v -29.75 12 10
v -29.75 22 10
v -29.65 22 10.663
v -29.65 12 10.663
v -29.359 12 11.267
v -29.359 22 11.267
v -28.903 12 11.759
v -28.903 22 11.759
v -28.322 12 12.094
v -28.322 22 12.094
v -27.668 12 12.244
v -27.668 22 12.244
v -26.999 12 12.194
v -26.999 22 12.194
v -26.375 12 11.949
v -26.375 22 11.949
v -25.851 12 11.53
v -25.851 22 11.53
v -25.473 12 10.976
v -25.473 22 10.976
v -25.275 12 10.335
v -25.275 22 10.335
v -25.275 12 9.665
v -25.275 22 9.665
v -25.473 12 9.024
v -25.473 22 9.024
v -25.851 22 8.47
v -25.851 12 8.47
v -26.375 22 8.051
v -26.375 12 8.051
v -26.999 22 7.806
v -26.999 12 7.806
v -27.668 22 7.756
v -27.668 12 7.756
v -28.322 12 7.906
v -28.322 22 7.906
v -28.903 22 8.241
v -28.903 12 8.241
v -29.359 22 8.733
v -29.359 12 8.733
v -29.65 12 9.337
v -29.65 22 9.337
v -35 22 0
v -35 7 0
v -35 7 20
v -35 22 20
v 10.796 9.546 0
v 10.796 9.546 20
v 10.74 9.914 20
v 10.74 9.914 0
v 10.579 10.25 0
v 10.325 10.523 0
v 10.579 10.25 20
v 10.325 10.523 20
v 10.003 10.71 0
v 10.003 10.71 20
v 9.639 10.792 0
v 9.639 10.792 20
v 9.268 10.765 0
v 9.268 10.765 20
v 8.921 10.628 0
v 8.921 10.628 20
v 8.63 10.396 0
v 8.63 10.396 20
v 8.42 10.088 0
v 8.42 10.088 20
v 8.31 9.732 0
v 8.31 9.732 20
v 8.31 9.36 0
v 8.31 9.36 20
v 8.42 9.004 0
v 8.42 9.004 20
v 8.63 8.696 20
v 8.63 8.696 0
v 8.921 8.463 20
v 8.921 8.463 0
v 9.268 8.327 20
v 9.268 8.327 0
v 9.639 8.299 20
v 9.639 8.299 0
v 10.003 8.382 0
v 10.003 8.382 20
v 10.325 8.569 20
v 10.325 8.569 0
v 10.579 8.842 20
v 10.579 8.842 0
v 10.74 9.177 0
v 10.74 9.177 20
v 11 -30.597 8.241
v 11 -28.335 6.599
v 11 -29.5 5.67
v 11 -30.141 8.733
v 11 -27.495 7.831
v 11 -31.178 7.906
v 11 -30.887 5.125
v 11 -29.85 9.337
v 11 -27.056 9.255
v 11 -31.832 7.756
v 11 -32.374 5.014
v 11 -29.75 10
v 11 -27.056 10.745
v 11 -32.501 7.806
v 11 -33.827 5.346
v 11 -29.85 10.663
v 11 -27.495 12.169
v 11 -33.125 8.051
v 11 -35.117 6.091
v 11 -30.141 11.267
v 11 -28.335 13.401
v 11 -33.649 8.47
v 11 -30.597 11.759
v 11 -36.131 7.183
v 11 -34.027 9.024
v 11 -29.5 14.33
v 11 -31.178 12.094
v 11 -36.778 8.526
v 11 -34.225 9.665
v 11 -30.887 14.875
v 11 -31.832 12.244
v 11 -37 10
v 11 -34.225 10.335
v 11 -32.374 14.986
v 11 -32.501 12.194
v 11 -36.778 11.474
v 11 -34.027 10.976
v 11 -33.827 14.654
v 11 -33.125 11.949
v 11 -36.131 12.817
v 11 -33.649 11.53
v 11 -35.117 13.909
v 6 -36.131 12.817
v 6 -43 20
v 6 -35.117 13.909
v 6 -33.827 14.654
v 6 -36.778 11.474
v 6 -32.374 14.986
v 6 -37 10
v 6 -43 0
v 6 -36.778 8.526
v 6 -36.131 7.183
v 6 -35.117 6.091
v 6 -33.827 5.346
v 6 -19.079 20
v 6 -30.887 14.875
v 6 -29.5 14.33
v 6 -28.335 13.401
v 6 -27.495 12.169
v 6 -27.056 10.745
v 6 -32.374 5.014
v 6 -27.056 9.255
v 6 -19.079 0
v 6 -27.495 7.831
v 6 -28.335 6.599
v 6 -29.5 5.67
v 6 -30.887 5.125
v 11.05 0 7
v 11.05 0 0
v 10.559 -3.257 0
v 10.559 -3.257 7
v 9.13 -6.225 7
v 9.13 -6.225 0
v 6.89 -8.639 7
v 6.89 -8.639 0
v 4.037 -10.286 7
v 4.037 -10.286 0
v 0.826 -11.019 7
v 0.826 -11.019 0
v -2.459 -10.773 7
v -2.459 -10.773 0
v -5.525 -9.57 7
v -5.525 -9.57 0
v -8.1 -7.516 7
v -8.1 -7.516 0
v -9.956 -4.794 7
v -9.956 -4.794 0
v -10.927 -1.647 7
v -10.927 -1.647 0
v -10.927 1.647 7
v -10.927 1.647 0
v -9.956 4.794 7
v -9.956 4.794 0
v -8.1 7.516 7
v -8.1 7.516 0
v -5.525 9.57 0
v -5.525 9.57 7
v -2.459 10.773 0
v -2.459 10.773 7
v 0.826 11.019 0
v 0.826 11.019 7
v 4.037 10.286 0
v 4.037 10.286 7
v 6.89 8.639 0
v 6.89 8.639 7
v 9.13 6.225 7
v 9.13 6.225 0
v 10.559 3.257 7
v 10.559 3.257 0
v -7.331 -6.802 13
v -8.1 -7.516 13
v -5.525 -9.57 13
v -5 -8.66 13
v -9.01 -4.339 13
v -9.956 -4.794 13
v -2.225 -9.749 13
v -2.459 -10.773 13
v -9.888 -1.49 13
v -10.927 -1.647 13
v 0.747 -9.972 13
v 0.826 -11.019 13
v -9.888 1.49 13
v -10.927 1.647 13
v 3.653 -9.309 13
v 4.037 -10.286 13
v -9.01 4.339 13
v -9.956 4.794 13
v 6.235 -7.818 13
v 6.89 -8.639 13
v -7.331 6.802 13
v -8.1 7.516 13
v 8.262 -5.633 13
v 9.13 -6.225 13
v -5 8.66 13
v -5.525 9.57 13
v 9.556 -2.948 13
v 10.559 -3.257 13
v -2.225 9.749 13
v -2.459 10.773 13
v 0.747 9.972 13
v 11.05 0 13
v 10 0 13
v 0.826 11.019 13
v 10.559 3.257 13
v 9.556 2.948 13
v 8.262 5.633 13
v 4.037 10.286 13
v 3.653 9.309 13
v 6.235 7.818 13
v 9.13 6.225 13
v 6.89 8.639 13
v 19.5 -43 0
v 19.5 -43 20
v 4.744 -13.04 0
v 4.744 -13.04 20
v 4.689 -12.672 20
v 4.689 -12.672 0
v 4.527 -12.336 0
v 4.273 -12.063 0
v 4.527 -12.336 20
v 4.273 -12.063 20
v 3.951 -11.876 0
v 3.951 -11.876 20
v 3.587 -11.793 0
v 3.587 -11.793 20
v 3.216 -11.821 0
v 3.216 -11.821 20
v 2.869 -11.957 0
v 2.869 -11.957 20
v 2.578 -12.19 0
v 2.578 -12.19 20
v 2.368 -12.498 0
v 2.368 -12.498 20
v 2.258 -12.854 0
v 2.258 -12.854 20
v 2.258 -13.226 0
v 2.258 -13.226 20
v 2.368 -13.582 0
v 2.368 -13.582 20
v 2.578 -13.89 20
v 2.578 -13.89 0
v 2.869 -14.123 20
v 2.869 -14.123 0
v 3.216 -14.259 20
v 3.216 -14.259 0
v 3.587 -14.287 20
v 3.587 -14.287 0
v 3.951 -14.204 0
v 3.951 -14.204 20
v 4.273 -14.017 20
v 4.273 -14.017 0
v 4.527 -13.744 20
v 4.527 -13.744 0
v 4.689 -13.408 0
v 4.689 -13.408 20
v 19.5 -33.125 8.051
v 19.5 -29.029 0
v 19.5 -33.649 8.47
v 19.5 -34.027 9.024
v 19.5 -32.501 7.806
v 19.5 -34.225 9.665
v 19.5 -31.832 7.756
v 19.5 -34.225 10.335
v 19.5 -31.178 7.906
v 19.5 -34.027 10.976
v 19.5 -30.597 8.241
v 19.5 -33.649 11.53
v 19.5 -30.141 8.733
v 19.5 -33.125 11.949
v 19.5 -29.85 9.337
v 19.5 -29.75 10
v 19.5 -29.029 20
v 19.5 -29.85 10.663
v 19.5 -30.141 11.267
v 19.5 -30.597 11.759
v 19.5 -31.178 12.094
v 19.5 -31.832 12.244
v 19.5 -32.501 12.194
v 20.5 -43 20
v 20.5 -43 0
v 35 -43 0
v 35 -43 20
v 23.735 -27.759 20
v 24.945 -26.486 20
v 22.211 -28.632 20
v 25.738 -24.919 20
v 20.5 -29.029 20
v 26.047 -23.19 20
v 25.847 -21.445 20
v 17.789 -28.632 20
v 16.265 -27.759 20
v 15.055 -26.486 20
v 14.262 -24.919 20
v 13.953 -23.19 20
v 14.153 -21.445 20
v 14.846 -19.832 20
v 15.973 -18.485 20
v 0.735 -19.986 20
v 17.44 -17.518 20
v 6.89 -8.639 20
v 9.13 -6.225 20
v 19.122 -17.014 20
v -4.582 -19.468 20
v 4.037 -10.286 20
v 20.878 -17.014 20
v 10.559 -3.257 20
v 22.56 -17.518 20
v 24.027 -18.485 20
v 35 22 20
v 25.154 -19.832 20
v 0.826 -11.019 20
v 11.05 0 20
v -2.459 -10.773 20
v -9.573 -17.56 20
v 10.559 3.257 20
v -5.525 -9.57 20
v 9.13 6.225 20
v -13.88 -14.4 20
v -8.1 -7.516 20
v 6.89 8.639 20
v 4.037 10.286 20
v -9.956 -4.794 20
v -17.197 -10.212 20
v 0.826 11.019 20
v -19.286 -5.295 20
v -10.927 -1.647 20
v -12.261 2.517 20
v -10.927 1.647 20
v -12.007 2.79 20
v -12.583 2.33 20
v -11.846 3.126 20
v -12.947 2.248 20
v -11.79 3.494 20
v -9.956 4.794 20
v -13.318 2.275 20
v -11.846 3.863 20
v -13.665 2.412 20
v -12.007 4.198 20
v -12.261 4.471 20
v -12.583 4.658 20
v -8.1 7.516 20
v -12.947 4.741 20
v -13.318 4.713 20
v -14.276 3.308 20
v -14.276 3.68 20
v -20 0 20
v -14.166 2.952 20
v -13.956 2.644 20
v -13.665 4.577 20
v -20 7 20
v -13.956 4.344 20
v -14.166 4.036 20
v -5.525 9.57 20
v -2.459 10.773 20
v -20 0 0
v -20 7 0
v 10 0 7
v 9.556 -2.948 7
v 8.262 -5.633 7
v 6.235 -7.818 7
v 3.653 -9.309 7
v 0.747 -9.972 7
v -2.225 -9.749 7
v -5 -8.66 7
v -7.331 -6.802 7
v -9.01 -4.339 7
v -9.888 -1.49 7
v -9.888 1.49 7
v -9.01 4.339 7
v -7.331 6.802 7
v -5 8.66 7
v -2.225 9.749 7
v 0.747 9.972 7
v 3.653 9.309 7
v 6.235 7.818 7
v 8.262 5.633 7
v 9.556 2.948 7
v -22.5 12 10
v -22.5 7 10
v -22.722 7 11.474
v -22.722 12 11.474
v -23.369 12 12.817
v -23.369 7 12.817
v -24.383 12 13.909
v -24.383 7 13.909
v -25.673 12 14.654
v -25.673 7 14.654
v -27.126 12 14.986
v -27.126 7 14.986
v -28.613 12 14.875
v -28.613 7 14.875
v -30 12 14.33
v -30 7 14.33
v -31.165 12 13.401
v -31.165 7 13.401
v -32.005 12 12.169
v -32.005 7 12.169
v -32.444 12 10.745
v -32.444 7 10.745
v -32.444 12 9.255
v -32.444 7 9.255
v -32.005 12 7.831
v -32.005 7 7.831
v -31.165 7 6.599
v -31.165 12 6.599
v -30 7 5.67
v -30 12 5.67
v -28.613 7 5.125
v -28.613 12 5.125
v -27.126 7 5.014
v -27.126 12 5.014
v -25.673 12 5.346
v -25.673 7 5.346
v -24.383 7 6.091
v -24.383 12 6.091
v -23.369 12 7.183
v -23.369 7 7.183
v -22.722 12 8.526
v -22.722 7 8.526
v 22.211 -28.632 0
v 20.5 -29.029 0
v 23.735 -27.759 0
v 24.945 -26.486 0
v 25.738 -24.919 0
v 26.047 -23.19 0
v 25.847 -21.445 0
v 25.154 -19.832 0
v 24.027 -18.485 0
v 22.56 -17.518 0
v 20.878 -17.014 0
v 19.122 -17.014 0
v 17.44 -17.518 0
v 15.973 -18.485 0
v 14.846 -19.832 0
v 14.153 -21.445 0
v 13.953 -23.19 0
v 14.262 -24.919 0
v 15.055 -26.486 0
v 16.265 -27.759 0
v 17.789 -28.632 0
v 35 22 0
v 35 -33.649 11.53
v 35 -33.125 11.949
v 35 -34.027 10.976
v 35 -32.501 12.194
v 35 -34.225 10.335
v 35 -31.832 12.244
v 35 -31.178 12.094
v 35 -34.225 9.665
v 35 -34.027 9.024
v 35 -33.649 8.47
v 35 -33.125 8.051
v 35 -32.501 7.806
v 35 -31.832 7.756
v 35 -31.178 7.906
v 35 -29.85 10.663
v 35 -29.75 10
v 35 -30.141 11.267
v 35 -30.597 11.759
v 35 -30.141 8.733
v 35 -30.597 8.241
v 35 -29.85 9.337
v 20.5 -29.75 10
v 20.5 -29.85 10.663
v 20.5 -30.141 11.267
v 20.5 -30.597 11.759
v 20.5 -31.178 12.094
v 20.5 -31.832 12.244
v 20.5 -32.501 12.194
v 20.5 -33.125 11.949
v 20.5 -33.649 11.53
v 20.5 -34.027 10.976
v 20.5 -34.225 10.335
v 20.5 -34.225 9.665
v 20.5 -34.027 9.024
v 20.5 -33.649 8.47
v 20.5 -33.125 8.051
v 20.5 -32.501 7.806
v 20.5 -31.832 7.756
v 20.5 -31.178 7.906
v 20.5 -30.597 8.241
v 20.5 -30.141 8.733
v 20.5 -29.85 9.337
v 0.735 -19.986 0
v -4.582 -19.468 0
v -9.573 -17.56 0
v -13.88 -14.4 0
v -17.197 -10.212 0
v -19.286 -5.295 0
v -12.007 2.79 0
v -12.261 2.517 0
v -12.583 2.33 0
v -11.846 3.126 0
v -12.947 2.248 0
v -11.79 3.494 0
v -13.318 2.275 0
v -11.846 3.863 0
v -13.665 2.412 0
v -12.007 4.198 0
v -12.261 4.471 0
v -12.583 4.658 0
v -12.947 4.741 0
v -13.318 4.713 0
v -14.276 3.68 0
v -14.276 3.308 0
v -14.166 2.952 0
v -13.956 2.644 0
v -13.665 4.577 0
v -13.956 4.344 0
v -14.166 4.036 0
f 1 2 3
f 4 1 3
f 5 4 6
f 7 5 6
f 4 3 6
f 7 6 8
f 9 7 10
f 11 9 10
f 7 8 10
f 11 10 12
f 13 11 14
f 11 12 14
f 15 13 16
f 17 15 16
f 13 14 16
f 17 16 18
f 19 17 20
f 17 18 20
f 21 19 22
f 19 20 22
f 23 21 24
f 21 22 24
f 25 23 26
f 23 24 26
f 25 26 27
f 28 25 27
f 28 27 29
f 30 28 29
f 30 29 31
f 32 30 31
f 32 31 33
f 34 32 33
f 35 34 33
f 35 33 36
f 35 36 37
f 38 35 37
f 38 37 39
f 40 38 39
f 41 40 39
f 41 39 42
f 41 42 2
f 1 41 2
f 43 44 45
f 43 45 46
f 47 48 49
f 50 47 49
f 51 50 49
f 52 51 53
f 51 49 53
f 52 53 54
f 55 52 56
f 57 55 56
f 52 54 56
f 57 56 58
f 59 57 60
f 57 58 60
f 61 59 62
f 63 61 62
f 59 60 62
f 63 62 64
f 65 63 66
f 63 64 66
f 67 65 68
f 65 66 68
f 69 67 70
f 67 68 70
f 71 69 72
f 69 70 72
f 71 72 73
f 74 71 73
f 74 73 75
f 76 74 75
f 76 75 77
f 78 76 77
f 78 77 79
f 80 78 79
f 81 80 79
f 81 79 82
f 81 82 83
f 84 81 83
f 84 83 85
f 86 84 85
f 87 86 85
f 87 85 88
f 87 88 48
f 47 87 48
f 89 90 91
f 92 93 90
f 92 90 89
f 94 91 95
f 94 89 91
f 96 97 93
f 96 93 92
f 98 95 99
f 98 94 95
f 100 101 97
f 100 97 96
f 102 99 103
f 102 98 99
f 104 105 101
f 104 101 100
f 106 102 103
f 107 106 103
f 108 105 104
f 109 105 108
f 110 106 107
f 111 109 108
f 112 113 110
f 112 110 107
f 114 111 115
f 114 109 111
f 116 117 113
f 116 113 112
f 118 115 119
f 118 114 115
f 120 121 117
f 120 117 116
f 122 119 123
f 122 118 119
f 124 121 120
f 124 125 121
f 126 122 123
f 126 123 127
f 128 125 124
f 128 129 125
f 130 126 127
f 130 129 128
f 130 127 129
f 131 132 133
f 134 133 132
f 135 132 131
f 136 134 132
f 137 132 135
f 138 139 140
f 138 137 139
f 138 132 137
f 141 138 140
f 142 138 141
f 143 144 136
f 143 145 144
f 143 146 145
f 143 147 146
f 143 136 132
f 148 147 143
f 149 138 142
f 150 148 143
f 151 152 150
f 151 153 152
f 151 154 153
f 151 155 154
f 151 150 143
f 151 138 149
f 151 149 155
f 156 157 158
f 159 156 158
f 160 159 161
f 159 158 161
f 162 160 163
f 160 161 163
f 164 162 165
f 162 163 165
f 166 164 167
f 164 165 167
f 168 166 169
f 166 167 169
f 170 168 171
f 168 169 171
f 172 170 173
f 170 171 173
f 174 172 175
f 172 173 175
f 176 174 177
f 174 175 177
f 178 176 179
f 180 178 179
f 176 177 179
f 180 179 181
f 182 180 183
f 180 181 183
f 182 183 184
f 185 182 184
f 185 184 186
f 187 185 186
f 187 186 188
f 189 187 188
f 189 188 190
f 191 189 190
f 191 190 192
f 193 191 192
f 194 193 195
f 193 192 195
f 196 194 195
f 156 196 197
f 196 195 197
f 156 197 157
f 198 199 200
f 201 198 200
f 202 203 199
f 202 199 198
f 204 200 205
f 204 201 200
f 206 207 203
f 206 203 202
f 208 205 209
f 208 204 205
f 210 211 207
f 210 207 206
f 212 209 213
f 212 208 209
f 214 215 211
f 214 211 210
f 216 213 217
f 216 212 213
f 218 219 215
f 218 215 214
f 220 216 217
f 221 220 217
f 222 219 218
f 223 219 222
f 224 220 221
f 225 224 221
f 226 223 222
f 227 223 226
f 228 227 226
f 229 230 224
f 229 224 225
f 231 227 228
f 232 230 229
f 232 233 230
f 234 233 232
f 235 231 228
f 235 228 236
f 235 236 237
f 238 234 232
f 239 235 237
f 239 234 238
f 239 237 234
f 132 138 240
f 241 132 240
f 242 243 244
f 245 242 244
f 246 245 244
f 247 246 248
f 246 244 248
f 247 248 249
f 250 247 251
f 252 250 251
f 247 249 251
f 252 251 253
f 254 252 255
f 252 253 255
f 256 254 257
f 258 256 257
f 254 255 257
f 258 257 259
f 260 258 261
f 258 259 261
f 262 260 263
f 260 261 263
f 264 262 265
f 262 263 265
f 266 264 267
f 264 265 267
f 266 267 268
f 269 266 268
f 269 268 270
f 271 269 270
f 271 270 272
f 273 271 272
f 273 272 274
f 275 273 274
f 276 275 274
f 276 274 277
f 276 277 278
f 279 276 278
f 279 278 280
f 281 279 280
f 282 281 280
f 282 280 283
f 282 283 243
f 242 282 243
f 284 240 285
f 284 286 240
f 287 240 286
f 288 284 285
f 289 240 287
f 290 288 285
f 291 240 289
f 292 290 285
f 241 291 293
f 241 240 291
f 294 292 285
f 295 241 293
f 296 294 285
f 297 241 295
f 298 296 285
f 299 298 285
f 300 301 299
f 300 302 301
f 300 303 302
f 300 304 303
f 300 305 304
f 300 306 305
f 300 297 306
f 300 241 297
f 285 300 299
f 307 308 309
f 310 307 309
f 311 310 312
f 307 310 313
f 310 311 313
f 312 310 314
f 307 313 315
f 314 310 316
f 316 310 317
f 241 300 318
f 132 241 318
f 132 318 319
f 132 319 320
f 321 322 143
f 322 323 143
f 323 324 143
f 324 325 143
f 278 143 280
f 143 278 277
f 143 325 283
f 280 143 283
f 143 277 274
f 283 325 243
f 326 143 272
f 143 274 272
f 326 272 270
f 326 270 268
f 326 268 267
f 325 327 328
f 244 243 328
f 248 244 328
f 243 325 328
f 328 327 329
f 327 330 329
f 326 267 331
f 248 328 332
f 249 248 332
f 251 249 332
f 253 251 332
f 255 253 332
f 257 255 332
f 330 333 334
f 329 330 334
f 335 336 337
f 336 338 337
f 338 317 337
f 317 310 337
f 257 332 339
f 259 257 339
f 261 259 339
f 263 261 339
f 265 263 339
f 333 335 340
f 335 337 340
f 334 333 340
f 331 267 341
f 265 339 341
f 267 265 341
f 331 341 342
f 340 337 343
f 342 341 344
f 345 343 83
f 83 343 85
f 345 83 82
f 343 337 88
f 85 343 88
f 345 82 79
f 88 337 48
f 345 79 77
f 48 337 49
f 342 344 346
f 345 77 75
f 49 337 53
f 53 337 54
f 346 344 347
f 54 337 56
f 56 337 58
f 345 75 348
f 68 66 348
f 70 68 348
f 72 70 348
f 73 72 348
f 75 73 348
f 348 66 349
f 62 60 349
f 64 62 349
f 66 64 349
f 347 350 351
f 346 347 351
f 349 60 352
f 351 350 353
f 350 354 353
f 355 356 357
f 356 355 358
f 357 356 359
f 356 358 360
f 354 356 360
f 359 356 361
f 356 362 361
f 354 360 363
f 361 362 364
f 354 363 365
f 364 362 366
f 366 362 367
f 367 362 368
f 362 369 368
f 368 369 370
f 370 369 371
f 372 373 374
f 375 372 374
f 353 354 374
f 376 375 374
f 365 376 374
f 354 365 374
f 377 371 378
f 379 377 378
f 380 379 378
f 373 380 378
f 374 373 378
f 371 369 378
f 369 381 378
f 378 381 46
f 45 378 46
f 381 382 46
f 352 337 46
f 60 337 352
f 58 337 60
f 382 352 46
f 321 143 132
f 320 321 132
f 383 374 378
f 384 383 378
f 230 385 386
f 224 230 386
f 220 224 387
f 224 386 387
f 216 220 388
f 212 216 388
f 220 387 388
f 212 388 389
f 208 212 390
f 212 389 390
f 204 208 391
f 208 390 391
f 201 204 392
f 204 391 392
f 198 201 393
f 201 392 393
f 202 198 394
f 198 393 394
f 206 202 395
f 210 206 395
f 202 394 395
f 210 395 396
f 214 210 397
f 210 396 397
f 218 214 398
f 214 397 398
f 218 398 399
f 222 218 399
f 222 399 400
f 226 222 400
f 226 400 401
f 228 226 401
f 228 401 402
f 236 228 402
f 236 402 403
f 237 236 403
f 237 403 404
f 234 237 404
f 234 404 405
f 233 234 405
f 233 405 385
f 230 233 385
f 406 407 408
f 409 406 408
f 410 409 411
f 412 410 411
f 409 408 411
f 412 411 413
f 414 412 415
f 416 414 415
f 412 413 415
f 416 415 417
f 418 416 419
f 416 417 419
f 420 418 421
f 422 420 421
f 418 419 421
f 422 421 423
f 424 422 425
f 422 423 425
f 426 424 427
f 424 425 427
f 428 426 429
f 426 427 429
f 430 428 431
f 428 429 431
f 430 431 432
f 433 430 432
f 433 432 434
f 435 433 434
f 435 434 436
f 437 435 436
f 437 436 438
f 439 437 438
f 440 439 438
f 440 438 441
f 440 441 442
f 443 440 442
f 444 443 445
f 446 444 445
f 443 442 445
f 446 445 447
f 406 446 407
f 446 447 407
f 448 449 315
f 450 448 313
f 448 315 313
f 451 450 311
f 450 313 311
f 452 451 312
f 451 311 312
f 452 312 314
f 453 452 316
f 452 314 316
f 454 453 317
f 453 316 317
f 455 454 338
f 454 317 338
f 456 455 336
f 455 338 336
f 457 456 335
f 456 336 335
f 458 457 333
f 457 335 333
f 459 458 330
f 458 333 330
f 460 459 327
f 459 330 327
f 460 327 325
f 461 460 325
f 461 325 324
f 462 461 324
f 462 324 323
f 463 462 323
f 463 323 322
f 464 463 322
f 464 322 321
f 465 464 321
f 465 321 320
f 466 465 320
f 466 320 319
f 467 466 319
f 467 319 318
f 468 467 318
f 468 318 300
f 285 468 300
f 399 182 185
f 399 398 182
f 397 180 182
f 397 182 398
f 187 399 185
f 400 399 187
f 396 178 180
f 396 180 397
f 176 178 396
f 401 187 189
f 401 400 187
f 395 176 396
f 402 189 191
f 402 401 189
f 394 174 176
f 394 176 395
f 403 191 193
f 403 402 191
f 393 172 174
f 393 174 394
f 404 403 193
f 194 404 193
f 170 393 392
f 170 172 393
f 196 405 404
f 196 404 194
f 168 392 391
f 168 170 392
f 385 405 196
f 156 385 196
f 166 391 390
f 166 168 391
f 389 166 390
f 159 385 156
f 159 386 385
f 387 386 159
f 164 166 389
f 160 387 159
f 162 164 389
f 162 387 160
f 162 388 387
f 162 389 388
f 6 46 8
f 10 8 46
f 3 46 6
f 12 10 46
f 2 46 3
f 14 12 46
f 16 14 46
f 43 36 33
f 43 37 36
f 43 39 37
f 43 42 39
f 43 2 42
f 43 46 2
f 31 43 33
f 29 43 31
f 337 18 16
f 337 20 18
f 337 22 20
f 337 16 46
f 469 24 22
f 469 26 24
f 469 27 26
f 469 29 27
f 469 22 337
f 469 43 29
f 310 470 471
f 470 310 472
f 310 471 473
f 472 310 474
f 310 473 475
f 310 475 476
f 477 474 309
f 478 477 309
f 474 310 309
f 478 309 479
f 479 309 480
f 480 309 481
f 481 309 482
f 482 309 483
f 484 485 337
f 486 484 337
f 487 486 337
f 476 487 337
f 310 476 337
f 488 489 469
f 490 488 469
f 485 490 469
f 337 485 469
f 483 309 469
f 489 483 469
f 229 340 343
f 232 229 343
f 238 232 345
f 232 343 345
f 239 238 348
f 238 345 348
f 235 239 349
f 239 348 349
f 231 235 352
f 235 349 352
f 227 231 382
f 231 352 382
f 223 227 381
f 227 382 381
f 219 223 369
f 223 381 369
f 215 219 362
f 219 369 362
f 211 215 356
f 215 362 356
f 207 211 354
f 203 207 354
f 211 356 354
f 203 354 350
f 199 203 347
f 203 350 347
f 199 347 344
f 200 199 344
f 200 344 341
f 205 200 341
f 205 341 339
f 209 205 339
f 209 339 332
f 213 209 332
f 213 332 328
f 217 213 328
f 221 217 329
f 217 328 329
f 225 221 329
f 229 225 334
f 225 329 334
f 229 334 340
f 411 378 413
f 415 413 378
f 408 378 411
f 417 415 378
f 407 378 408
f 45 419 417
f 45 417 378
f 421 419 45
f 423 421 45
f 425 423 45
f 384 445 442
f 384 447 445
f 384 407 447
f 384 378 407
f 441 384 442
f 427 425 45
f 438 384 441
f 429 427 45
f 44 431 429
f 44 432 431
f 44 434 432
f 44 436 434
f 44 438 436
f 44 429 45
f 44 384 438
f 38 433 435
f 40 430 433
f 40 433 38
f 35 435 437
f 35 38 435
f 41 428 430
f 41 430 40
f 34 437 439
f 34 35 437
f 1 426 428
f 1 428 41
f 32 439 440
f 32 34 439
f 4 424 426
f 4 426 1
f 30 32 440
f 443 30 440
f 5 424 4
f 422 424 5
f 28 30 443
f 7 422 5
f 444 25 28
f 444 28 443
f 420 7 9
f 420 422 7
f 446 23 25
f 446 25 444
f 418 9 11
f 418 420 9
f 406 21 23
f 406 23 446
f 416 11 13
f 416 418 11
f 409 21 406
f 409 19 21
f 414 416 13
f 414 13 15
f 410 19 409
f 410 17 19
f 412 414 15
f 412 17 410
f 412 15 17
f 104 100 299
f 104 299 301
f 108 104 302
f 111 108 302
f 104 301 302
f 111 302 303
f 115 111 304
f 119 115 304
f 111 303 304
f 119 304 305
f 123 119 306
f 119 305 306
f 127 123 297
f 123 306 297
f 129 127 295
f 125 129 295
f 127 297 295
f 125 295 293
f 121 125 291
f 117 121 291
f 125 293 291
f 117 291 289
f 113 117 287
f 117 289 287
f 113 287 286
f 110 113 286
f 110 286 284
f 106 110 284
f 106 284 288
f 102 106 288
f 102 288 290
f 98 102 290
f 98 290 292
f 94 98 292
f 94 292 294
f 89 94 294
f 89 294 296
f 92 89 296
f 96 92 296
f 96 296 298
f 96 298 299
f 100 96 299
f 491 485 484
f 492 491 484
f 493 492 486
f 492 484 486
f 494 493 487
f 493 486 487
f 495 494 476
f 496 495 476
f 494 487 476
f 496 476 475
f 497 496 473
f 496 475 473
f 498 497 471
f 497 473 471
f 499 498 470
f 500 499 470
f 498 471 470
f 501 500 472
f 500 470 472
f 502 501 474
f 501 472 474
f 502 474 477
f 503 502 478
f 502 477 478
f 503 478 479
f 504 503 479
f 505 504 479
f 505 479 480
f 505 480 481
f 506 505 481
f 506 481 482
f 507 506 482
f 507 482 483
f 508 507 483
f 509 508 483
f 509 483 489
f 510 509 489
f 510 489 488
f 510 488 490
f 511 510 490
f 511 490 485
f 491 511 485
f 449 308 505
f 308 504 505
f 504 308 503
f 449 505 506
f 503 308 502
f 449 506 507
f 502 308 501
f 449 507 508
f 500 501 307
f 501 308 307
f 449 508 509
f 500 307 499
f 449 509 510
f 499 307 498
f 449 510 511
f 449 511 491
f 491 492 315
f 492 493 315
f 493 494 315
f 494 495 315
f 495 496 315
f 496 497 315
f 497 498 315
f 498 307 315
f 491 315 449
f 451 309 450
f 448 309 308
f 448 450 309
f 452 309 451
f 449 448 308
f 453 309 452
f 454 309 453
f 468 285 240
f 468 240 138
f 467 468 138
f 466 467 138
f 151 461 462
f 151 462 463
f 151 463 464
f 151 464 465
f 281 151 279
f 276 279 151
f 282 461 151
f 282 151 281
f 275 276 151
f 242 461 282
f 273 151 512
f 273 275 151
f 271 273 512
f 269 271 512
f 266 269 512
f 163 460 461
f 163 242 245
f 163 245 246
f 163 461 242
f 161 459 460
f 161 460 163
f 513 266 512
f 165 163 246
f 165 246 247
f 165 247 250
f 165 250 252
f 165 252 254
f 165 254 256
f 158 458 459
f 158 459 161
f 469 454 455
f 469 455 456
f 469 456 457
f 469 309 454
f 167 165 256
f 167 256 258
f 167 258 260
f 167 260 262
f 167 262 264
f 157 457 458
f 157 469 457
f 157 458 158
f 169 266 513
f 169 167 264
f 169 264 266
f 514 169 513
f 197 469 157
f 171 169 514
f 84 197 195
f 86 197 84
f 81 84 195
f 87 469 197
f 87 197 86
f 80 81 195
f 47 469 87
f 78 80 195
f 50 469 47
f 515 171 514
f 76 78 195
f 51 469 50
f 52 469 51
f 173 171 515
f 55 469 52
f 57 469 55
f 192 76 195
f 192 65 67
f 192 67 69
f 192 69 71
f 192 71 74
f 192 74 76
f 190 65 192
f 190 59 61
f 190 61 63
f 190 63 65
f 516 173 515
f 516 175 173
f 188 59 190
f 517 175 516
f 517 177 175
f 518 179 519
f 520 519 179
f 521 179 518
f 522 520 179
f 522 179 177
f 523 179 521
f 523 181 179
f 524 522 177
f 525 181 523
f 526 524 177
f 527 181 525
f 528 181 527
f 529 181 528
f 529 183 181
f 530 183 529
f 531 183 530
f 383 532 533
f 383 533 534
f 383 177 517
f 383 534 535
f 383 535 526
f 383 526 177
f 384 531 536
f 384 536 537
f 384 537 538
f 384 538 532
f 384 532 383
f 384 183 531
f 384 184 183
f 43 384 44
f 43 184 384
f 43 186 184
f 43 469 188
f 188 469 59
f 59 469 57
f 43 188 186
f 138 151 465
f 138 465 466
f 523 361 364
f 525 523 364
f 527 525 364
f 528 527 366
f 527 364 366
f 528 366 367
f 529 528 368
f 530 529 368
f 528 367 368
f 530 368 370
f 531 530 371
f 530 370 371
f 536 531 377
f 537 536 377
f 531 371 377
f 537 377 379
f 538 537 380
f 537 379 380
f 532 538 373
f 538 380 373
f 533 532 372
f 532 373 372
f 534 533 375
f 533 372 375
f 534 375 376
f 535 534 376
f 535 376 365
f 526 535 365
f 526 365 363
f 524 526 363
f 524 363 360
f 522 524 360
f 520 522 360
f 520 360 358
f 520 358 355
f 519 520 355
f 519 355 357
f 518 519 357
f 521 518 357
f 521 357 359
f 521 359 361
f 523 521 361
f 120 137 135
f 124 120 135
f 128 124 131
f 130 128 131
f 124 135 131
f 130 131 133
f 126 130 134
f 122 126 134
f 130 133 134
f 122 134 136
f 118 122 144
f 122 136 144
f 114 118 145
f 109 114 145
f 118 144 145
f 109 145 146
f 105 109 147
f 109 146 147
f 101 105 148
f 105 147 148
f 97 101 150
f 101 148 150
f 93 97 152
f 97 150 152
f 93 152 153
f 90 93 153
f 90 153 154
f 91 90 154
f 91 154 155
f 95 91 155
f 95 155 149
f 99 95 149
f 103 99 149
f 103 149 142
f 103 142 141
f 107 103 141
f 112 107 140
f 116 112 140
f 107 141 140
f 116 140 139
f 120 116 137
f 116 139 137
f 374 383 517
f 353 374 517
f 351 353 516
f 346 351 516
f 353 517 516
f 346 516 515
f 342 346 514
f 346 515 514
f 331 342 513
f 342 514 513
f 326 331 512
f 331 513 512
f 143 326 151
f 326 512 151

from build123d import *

# Parameters (mm, degrees)
PAD_DEPTH       = 20
SKETCH006_R     = 10
POCKET_DEPTH    = 20.001
SKETCH005_R     = 11.05
POCKET001_DEPTH = 7
SKETCH002_R     = 2.25
POCKET002_DEPTH = 65.001
SKETCH003_R     = 5
POCKET003_DEPTH = 5
SKETCH007_R     = 2.25
POCKET004_DEPTH = 70.001
SKETCH008_R     = 5
POCKET005_DEPTH = 5
SKETCH009_R     = 11.05
POCKET006_DEPTH = 7
SKETCH010_R     = 6.05
POCKET007_DEPTH = 20.001
SKETCH011_W     = 1
SKETCH011_H     = 25
POCKET008_DEPTH = 20.001
SKETCH012_R     = 1.25
POCKET009_DEPTH = 20.001


with BuildPart() as part:
    # Sketch → Pad (new body)
    with BuildSketch(Plane.XY):
        with BuildLine():
            Line((-35, 22), (35, 22))
            Line((35, -43), (35, 22))
            Line((6, -43), (35, -43))
            Line((6, -43), (6, -19.078784))
            ThreePointArc((-20, 0), (-11.83216, -16.124515), (6, -19.078784))
            Line((-20, 0), (-20, 7))
            Line((-20, 7), (-35, 7))
            Line((-35, 7), (-35, 22))
        make_face()
    extrude(amount=PAD_DEPTH)

    # Sketch006 → Pocket (cut, through all)
    with BuildSketch(Plane(origin=(0, 0, 0), x_dir=(1, 0, 0), z_dir=(0, 0, -1))):
        Circle(SKETCH006_R)
    extrude(amount=-POCKET_DEPTH, mode=Mode.SUBTRACT)

    # Sketch005 → Pocket001 (cut)
    with BuildSketch(Plane.XY.offset(20)):
        Circle(SKETCH005_R)
    extrude(amount=-POCKET001_DEPTH, mode=Mode.SUBTRACT)

    # Sketch002 → Pocket002 (cut, through all)
    with BuildSketch(Plane(origin=(0, 22, 0), x_dir=(-1, 0, 0), z_dir=(0, 1, 0))):
        with Locations((27.5, 10)):
            Circle(SKETCH002_R)
    extrude(amount=-POCKET002_DEPTH, mode=Mode.SUBTRACT)

    # Sketch003 → Pocket003 (cut)
    with BuildSketch(Plane.XZ.offset(-7)):
        with Locations((-27.5, 10)):
            Circle(SKETCH003_R)
    extrude(amount=-POCKET003_DEPTH, mode=Mode.SUBTRACT)

    # Sketch007 → Pocket004 (cut, through all)
    with BuildSketch(Plane.YZ.offset(35)):
        with Locations((-32, 10)):
            Circle(SKETCH007_R)
    extrude(amount=-POCKET004_DEPTH, mode=Mode.SUBTRACT)

    # Sketch008 → Pocket005 (cut)
    with BuildSketch(Plane(origin=(6, 0, 0), x_dir=(0, -1, 0), z_dir=(-1, 0, 0))):
        with Locations((32, 10)):
            Circle(SKETCH008_R)
    extrude(amount=-POCKET005_DEPTH, mode=Mode.SUBTRACT)

    # Sketch009 → Pocket006 (cut)
    with BuildSketch(Plane(origin=(0, 0, 0), x_dir=(1, 0, 0), z_dir=(0, 0, -1))):
        Circle(SKETCH009_R)
    extrude(amount=-POCKET006_DEPTH, mode=Mode.SUBTRACT)

    # Sketch010 → Pocket007 (cut, through all)
    with BuildSketch(Plane.XY.offset(20)):
        with Locations((20, -23)):
            Circle(SKETCH010_R)
    extrude(amount=-POCKET007_DEPTH, mode=Mode.SUBTRACT)

    # Sketch011 → Pocket008 (cut, through all)
    with BuildSketch(Plane.XY.offset(20)):
        with Locations((20, -32.5)):
            Rectangle(SKETCH011_W, SKETCH011_H)
    extrude(amount=-POCKET008_DEPTH, mode=Mode.SUBTRACT)

    # Sketch012 → Pocket009 (cut, through all)
    with BuildSketch(Plane.XY.offset(20)):
        with Locations((9.545942, 9.545942)):
            Circle(SKETCH012_R)
        with Locations((-13.039999, 3.494057)):
            Circle(SKETCH012_R)
        with Locations((3.494057, -13.039999)):
            Circle(SKETCH012_R)
    extrude(amount=-POCKET009_DEPTH, mode=Mode.SUBTRACT)


solid = part.part
